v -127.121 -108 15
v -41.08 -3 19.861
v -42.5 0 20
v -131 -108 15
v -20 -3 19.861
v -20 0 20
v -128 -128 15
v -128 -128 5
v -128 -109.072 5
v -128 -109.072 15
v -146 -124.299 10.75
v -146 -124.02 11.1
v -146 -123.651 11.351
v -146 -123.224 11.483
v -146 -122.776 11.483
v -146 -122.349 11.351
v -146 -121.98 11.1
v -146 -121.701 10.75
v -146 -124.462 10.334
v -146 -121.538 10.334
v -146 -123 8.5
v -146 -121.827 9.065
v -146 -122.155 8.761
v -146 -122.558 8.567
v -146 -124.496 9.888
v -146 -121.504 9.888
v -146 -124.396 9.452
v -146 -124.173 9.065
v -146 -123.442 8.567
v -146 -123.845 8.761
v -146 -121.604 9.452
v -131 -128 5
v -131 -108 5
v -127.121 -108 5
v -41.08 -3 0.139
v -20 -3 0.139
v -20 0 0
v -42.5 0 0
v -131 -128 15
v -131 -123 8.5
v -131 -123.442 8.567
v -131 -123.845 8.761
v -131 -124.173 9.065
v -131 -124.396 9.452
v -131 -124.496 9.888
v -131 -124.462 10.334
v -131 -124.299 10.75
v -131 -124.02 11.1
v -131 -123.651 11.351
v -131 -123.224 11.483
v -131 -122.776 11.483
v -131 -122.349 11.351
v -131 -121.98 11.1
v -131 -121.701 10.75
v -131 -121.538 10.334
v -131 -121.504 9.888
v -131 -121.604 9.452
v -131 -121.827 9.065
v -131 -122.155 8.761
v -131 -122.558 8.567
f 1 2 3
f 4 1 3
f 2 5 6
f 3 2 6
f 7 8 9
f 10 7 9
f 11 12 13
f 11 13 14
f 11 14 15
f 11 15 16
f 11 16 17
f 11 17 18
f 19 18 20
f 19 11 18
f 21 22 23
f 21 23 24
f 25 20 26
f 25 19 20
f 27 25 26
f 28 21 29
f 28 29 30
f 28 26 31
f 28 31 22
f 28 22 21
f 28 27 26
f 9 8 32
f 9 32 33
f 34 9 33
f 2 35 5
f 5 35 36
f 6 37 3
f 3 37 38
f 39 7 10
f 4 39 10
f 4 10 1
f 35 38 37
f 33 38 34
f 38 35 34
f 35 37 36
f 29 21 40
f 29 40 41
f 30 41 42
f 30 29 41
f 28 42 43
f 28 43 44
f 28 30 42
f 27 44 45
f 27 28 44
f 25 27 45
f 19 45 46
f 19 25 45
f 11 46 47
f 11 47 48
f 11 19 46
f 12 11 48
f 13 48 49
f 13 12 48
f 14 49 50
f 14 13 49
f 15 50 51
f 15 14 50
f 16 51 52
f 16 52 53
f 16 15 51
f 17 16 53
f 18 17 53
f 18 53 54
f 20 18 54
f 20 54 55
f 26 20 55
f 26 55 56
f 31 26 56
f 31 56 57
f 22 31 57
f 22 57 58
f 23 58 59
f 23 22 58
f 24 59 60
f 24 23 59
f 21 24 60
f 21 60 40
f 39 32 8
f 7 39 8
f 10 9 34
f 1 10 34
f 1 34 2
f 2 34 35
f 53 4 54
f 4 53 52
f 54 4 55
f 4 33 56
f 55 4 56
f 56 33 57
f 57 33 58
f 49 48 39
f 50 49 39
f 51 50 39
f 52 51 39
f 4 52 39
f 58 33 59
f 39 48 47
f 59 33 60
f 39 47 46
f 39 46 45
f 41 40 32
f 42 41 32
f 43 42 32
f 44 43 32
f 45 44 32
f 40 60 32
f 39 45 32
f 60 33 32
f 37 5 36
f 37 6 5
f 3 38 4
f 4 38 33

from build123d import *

# Parameters (mm, degrees)
BOSS_EXTRUDE1_DEPTH = 20
SKETCH6_W           = 5
SKETCH6_H           = 20
CUT_EXTRUDE1_DEPTH  = 293.280687012
SKETCH7_R           = 1.5
BOSS_EXTRUDE2_DEPTH = 15
BOSS_EXTRUDE3_START = 15
SKETCH8_R           = 1.5
BOSS_EXTRUDE3_DEPTH = 15
SKETCH9_W           = 68.096715613
SKETCH9_H           = 158.263972947
CUT_EXTRUDE2_DEPTH  = 153
SKETCH10_W          = 29.496800943
SKETCH10_H          = 9.142322102
CUT_EXTRUDE3_DEPTH  = 20


with BuildPart() as part:
    # Sketch5 → Boss-Extrude1 (new body)
    with BuildSketch(Plane.XY):
        Polygon((0, 0), (-42.5, 0), (-131, -108), (-131, -128), (-128, -128), (-128, -109.072168564), (-41.07975076, -3), (0, -3), align=None)
        Polygon((42.5, 0), (0, 0), (0, -3), (41.07975076, -3), (128, -109.072168564), (128, -128), (131, -128), (131, -108), align=None)
    extrude(amount=BOSS_EXTRUDE1_DEPTH)

    # Sketch6 → Cut-Extrude1 (cut, through all)
    with BuildSketch(Plane(origin=(131, 0, 0), x_dir=(0, 0, -1), z_dir=(1, 0, 0))):
        with Locations((-17.5, -118)):
            Rectangle(SKETCH6_W, SKETCH6_H)
        Polygon((-20, -108), (-15, -108), (-20, 0), align=None)
        Polygon((0, 0), (-5, -108), (0, -108), align=None)
        with Locations((-2.5, -118)):
            Rectangle(SKETCH6_W, SKETCH6_H)
    extrude(amount=-CUT_EXTRUDE1_DEPTH, mode=Mode.SUBTRACT)

    # Sketch7 → Boss-Extrude2 (add)
    with BuildSketch(Plane(origin=(131, 0, 0), x_dir=(0, 0, -1), z_dir=(1, 0, 0))):
        with Locations((-10, -123)):
            Circle(SKETCH7_R)
    extrude(amount=BOSS_EXTRUDE2_DEPTH)

    # Sketch8 → Boss-Extrude3 (add)
    with BuildSketch(Plane.ZY.offset(131).offset(BOSS_EXTRUDE3_START)):
        with Locations(Location((10, -123, 0), (0, 0, 180))):
            Circle(SKETCH8_R)
    extrude(amount=-BOSS_EXTRUDE3_DEPTH)

    # Sketch9 → Cut-Extrude2 (cut)
    with BuildSketch(Plane(origin=(0, 0, 0), x_dir=(0, 0, -1), z_dir=(1, 0, 0))):
        with Locations((10.702862104, -71.494594105)):
            Rectangle(SKETCH9_W, SKETCH9_H)
    extrude(amount=CUT_EXTRUDE2_DEPTH, mode=Mode.SUBTRACT)

    # Sketch10 → Cut-Extrude3 (cut)
    with BuildSketch(Plane(origin=(0, 0, 0), x_dir=(0, 0, -1), z_dir=(1, 0, 0))):
        with Locations((-8.497508997, -2.151596762)):
            Rectangle(SKETCH10_W, SKETCH10_H)
    extrude(amount=-CUT_EXTRUDE3_DEPTH, mode=Mode.SUBTRACT)


solid = part.part
